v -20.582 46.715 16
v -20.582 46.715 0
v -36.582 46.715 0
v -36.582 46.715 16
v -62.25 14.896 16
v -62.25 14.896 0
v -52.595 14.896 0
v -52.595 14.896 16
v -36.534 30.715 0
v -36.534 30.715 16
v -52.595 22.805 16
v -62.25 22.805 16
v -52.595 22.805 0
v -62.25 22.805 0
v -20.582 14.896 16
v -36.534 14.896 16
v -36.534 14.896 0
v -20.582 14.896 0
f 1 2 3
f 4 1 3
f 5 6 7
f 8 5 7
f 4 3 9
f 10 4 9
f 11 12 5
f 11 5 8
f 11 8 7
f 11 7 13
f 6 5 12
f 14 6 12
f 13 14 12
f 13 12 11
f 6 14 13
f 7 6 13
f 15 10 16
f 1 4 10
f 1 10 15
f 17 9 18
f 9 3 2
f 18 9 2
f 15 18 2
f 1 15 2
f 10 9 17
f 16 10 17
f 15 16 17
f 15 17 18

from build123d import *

# Parameters (mm, degrees)
F0_W     = 10.151514
F0_H     = 16
F0_W_2   = 9.655044
F0_H_2   = 7.909527
F1_DEPTH = 16
F2_DEPTH = 16
F3_DEPTH = 16


with BuildPart() as f1:
    # F0 (on Top) → F1 (new body)
    with BuildSketch(Plane.XY):
        Polygon((-36.582487, 46.714936), (-36.533692, 30.714936), (-30.734001, 30.714936), (-30.734001, 46.714936), align=None)
        Polygon((-30.734001, 30.714936), (-36.533692, 30.714936), (-36.533692, 14.895882), (-20.582487, 14.895882), (-20.582487, 30.714936), align=None)
        with Locations((-25.658244, 38.714936)):
            Rectangle(F0_W, F0_H)
        with Locations((-57.422957, 18.850645)):
            Rectangle(F0_W_2, F0_H_2)
    extrude(amount=F1_DEPTH)

    # F0 (on Top) → F2 (join)
    with BuildSketch(Plane.XY):
        Polygon((-30.734001, 30.714936), (-36.533692, 30.714936), (-36.533692, 14.895882), (-20.582487, 14.895882), (-20.582487, 30.714936), align=None)
    extrude(amount=F2_DEPTH)

    # F0 (on Top) → F3 (join)
    with BuildSketch(Plane.XY):
        with Locations((-57.422957, 18.850645)):
            Rectangle(F0_W_2, F0_H_2)
    extrude(amount=F3_DEPTH)


solid = f1.part
